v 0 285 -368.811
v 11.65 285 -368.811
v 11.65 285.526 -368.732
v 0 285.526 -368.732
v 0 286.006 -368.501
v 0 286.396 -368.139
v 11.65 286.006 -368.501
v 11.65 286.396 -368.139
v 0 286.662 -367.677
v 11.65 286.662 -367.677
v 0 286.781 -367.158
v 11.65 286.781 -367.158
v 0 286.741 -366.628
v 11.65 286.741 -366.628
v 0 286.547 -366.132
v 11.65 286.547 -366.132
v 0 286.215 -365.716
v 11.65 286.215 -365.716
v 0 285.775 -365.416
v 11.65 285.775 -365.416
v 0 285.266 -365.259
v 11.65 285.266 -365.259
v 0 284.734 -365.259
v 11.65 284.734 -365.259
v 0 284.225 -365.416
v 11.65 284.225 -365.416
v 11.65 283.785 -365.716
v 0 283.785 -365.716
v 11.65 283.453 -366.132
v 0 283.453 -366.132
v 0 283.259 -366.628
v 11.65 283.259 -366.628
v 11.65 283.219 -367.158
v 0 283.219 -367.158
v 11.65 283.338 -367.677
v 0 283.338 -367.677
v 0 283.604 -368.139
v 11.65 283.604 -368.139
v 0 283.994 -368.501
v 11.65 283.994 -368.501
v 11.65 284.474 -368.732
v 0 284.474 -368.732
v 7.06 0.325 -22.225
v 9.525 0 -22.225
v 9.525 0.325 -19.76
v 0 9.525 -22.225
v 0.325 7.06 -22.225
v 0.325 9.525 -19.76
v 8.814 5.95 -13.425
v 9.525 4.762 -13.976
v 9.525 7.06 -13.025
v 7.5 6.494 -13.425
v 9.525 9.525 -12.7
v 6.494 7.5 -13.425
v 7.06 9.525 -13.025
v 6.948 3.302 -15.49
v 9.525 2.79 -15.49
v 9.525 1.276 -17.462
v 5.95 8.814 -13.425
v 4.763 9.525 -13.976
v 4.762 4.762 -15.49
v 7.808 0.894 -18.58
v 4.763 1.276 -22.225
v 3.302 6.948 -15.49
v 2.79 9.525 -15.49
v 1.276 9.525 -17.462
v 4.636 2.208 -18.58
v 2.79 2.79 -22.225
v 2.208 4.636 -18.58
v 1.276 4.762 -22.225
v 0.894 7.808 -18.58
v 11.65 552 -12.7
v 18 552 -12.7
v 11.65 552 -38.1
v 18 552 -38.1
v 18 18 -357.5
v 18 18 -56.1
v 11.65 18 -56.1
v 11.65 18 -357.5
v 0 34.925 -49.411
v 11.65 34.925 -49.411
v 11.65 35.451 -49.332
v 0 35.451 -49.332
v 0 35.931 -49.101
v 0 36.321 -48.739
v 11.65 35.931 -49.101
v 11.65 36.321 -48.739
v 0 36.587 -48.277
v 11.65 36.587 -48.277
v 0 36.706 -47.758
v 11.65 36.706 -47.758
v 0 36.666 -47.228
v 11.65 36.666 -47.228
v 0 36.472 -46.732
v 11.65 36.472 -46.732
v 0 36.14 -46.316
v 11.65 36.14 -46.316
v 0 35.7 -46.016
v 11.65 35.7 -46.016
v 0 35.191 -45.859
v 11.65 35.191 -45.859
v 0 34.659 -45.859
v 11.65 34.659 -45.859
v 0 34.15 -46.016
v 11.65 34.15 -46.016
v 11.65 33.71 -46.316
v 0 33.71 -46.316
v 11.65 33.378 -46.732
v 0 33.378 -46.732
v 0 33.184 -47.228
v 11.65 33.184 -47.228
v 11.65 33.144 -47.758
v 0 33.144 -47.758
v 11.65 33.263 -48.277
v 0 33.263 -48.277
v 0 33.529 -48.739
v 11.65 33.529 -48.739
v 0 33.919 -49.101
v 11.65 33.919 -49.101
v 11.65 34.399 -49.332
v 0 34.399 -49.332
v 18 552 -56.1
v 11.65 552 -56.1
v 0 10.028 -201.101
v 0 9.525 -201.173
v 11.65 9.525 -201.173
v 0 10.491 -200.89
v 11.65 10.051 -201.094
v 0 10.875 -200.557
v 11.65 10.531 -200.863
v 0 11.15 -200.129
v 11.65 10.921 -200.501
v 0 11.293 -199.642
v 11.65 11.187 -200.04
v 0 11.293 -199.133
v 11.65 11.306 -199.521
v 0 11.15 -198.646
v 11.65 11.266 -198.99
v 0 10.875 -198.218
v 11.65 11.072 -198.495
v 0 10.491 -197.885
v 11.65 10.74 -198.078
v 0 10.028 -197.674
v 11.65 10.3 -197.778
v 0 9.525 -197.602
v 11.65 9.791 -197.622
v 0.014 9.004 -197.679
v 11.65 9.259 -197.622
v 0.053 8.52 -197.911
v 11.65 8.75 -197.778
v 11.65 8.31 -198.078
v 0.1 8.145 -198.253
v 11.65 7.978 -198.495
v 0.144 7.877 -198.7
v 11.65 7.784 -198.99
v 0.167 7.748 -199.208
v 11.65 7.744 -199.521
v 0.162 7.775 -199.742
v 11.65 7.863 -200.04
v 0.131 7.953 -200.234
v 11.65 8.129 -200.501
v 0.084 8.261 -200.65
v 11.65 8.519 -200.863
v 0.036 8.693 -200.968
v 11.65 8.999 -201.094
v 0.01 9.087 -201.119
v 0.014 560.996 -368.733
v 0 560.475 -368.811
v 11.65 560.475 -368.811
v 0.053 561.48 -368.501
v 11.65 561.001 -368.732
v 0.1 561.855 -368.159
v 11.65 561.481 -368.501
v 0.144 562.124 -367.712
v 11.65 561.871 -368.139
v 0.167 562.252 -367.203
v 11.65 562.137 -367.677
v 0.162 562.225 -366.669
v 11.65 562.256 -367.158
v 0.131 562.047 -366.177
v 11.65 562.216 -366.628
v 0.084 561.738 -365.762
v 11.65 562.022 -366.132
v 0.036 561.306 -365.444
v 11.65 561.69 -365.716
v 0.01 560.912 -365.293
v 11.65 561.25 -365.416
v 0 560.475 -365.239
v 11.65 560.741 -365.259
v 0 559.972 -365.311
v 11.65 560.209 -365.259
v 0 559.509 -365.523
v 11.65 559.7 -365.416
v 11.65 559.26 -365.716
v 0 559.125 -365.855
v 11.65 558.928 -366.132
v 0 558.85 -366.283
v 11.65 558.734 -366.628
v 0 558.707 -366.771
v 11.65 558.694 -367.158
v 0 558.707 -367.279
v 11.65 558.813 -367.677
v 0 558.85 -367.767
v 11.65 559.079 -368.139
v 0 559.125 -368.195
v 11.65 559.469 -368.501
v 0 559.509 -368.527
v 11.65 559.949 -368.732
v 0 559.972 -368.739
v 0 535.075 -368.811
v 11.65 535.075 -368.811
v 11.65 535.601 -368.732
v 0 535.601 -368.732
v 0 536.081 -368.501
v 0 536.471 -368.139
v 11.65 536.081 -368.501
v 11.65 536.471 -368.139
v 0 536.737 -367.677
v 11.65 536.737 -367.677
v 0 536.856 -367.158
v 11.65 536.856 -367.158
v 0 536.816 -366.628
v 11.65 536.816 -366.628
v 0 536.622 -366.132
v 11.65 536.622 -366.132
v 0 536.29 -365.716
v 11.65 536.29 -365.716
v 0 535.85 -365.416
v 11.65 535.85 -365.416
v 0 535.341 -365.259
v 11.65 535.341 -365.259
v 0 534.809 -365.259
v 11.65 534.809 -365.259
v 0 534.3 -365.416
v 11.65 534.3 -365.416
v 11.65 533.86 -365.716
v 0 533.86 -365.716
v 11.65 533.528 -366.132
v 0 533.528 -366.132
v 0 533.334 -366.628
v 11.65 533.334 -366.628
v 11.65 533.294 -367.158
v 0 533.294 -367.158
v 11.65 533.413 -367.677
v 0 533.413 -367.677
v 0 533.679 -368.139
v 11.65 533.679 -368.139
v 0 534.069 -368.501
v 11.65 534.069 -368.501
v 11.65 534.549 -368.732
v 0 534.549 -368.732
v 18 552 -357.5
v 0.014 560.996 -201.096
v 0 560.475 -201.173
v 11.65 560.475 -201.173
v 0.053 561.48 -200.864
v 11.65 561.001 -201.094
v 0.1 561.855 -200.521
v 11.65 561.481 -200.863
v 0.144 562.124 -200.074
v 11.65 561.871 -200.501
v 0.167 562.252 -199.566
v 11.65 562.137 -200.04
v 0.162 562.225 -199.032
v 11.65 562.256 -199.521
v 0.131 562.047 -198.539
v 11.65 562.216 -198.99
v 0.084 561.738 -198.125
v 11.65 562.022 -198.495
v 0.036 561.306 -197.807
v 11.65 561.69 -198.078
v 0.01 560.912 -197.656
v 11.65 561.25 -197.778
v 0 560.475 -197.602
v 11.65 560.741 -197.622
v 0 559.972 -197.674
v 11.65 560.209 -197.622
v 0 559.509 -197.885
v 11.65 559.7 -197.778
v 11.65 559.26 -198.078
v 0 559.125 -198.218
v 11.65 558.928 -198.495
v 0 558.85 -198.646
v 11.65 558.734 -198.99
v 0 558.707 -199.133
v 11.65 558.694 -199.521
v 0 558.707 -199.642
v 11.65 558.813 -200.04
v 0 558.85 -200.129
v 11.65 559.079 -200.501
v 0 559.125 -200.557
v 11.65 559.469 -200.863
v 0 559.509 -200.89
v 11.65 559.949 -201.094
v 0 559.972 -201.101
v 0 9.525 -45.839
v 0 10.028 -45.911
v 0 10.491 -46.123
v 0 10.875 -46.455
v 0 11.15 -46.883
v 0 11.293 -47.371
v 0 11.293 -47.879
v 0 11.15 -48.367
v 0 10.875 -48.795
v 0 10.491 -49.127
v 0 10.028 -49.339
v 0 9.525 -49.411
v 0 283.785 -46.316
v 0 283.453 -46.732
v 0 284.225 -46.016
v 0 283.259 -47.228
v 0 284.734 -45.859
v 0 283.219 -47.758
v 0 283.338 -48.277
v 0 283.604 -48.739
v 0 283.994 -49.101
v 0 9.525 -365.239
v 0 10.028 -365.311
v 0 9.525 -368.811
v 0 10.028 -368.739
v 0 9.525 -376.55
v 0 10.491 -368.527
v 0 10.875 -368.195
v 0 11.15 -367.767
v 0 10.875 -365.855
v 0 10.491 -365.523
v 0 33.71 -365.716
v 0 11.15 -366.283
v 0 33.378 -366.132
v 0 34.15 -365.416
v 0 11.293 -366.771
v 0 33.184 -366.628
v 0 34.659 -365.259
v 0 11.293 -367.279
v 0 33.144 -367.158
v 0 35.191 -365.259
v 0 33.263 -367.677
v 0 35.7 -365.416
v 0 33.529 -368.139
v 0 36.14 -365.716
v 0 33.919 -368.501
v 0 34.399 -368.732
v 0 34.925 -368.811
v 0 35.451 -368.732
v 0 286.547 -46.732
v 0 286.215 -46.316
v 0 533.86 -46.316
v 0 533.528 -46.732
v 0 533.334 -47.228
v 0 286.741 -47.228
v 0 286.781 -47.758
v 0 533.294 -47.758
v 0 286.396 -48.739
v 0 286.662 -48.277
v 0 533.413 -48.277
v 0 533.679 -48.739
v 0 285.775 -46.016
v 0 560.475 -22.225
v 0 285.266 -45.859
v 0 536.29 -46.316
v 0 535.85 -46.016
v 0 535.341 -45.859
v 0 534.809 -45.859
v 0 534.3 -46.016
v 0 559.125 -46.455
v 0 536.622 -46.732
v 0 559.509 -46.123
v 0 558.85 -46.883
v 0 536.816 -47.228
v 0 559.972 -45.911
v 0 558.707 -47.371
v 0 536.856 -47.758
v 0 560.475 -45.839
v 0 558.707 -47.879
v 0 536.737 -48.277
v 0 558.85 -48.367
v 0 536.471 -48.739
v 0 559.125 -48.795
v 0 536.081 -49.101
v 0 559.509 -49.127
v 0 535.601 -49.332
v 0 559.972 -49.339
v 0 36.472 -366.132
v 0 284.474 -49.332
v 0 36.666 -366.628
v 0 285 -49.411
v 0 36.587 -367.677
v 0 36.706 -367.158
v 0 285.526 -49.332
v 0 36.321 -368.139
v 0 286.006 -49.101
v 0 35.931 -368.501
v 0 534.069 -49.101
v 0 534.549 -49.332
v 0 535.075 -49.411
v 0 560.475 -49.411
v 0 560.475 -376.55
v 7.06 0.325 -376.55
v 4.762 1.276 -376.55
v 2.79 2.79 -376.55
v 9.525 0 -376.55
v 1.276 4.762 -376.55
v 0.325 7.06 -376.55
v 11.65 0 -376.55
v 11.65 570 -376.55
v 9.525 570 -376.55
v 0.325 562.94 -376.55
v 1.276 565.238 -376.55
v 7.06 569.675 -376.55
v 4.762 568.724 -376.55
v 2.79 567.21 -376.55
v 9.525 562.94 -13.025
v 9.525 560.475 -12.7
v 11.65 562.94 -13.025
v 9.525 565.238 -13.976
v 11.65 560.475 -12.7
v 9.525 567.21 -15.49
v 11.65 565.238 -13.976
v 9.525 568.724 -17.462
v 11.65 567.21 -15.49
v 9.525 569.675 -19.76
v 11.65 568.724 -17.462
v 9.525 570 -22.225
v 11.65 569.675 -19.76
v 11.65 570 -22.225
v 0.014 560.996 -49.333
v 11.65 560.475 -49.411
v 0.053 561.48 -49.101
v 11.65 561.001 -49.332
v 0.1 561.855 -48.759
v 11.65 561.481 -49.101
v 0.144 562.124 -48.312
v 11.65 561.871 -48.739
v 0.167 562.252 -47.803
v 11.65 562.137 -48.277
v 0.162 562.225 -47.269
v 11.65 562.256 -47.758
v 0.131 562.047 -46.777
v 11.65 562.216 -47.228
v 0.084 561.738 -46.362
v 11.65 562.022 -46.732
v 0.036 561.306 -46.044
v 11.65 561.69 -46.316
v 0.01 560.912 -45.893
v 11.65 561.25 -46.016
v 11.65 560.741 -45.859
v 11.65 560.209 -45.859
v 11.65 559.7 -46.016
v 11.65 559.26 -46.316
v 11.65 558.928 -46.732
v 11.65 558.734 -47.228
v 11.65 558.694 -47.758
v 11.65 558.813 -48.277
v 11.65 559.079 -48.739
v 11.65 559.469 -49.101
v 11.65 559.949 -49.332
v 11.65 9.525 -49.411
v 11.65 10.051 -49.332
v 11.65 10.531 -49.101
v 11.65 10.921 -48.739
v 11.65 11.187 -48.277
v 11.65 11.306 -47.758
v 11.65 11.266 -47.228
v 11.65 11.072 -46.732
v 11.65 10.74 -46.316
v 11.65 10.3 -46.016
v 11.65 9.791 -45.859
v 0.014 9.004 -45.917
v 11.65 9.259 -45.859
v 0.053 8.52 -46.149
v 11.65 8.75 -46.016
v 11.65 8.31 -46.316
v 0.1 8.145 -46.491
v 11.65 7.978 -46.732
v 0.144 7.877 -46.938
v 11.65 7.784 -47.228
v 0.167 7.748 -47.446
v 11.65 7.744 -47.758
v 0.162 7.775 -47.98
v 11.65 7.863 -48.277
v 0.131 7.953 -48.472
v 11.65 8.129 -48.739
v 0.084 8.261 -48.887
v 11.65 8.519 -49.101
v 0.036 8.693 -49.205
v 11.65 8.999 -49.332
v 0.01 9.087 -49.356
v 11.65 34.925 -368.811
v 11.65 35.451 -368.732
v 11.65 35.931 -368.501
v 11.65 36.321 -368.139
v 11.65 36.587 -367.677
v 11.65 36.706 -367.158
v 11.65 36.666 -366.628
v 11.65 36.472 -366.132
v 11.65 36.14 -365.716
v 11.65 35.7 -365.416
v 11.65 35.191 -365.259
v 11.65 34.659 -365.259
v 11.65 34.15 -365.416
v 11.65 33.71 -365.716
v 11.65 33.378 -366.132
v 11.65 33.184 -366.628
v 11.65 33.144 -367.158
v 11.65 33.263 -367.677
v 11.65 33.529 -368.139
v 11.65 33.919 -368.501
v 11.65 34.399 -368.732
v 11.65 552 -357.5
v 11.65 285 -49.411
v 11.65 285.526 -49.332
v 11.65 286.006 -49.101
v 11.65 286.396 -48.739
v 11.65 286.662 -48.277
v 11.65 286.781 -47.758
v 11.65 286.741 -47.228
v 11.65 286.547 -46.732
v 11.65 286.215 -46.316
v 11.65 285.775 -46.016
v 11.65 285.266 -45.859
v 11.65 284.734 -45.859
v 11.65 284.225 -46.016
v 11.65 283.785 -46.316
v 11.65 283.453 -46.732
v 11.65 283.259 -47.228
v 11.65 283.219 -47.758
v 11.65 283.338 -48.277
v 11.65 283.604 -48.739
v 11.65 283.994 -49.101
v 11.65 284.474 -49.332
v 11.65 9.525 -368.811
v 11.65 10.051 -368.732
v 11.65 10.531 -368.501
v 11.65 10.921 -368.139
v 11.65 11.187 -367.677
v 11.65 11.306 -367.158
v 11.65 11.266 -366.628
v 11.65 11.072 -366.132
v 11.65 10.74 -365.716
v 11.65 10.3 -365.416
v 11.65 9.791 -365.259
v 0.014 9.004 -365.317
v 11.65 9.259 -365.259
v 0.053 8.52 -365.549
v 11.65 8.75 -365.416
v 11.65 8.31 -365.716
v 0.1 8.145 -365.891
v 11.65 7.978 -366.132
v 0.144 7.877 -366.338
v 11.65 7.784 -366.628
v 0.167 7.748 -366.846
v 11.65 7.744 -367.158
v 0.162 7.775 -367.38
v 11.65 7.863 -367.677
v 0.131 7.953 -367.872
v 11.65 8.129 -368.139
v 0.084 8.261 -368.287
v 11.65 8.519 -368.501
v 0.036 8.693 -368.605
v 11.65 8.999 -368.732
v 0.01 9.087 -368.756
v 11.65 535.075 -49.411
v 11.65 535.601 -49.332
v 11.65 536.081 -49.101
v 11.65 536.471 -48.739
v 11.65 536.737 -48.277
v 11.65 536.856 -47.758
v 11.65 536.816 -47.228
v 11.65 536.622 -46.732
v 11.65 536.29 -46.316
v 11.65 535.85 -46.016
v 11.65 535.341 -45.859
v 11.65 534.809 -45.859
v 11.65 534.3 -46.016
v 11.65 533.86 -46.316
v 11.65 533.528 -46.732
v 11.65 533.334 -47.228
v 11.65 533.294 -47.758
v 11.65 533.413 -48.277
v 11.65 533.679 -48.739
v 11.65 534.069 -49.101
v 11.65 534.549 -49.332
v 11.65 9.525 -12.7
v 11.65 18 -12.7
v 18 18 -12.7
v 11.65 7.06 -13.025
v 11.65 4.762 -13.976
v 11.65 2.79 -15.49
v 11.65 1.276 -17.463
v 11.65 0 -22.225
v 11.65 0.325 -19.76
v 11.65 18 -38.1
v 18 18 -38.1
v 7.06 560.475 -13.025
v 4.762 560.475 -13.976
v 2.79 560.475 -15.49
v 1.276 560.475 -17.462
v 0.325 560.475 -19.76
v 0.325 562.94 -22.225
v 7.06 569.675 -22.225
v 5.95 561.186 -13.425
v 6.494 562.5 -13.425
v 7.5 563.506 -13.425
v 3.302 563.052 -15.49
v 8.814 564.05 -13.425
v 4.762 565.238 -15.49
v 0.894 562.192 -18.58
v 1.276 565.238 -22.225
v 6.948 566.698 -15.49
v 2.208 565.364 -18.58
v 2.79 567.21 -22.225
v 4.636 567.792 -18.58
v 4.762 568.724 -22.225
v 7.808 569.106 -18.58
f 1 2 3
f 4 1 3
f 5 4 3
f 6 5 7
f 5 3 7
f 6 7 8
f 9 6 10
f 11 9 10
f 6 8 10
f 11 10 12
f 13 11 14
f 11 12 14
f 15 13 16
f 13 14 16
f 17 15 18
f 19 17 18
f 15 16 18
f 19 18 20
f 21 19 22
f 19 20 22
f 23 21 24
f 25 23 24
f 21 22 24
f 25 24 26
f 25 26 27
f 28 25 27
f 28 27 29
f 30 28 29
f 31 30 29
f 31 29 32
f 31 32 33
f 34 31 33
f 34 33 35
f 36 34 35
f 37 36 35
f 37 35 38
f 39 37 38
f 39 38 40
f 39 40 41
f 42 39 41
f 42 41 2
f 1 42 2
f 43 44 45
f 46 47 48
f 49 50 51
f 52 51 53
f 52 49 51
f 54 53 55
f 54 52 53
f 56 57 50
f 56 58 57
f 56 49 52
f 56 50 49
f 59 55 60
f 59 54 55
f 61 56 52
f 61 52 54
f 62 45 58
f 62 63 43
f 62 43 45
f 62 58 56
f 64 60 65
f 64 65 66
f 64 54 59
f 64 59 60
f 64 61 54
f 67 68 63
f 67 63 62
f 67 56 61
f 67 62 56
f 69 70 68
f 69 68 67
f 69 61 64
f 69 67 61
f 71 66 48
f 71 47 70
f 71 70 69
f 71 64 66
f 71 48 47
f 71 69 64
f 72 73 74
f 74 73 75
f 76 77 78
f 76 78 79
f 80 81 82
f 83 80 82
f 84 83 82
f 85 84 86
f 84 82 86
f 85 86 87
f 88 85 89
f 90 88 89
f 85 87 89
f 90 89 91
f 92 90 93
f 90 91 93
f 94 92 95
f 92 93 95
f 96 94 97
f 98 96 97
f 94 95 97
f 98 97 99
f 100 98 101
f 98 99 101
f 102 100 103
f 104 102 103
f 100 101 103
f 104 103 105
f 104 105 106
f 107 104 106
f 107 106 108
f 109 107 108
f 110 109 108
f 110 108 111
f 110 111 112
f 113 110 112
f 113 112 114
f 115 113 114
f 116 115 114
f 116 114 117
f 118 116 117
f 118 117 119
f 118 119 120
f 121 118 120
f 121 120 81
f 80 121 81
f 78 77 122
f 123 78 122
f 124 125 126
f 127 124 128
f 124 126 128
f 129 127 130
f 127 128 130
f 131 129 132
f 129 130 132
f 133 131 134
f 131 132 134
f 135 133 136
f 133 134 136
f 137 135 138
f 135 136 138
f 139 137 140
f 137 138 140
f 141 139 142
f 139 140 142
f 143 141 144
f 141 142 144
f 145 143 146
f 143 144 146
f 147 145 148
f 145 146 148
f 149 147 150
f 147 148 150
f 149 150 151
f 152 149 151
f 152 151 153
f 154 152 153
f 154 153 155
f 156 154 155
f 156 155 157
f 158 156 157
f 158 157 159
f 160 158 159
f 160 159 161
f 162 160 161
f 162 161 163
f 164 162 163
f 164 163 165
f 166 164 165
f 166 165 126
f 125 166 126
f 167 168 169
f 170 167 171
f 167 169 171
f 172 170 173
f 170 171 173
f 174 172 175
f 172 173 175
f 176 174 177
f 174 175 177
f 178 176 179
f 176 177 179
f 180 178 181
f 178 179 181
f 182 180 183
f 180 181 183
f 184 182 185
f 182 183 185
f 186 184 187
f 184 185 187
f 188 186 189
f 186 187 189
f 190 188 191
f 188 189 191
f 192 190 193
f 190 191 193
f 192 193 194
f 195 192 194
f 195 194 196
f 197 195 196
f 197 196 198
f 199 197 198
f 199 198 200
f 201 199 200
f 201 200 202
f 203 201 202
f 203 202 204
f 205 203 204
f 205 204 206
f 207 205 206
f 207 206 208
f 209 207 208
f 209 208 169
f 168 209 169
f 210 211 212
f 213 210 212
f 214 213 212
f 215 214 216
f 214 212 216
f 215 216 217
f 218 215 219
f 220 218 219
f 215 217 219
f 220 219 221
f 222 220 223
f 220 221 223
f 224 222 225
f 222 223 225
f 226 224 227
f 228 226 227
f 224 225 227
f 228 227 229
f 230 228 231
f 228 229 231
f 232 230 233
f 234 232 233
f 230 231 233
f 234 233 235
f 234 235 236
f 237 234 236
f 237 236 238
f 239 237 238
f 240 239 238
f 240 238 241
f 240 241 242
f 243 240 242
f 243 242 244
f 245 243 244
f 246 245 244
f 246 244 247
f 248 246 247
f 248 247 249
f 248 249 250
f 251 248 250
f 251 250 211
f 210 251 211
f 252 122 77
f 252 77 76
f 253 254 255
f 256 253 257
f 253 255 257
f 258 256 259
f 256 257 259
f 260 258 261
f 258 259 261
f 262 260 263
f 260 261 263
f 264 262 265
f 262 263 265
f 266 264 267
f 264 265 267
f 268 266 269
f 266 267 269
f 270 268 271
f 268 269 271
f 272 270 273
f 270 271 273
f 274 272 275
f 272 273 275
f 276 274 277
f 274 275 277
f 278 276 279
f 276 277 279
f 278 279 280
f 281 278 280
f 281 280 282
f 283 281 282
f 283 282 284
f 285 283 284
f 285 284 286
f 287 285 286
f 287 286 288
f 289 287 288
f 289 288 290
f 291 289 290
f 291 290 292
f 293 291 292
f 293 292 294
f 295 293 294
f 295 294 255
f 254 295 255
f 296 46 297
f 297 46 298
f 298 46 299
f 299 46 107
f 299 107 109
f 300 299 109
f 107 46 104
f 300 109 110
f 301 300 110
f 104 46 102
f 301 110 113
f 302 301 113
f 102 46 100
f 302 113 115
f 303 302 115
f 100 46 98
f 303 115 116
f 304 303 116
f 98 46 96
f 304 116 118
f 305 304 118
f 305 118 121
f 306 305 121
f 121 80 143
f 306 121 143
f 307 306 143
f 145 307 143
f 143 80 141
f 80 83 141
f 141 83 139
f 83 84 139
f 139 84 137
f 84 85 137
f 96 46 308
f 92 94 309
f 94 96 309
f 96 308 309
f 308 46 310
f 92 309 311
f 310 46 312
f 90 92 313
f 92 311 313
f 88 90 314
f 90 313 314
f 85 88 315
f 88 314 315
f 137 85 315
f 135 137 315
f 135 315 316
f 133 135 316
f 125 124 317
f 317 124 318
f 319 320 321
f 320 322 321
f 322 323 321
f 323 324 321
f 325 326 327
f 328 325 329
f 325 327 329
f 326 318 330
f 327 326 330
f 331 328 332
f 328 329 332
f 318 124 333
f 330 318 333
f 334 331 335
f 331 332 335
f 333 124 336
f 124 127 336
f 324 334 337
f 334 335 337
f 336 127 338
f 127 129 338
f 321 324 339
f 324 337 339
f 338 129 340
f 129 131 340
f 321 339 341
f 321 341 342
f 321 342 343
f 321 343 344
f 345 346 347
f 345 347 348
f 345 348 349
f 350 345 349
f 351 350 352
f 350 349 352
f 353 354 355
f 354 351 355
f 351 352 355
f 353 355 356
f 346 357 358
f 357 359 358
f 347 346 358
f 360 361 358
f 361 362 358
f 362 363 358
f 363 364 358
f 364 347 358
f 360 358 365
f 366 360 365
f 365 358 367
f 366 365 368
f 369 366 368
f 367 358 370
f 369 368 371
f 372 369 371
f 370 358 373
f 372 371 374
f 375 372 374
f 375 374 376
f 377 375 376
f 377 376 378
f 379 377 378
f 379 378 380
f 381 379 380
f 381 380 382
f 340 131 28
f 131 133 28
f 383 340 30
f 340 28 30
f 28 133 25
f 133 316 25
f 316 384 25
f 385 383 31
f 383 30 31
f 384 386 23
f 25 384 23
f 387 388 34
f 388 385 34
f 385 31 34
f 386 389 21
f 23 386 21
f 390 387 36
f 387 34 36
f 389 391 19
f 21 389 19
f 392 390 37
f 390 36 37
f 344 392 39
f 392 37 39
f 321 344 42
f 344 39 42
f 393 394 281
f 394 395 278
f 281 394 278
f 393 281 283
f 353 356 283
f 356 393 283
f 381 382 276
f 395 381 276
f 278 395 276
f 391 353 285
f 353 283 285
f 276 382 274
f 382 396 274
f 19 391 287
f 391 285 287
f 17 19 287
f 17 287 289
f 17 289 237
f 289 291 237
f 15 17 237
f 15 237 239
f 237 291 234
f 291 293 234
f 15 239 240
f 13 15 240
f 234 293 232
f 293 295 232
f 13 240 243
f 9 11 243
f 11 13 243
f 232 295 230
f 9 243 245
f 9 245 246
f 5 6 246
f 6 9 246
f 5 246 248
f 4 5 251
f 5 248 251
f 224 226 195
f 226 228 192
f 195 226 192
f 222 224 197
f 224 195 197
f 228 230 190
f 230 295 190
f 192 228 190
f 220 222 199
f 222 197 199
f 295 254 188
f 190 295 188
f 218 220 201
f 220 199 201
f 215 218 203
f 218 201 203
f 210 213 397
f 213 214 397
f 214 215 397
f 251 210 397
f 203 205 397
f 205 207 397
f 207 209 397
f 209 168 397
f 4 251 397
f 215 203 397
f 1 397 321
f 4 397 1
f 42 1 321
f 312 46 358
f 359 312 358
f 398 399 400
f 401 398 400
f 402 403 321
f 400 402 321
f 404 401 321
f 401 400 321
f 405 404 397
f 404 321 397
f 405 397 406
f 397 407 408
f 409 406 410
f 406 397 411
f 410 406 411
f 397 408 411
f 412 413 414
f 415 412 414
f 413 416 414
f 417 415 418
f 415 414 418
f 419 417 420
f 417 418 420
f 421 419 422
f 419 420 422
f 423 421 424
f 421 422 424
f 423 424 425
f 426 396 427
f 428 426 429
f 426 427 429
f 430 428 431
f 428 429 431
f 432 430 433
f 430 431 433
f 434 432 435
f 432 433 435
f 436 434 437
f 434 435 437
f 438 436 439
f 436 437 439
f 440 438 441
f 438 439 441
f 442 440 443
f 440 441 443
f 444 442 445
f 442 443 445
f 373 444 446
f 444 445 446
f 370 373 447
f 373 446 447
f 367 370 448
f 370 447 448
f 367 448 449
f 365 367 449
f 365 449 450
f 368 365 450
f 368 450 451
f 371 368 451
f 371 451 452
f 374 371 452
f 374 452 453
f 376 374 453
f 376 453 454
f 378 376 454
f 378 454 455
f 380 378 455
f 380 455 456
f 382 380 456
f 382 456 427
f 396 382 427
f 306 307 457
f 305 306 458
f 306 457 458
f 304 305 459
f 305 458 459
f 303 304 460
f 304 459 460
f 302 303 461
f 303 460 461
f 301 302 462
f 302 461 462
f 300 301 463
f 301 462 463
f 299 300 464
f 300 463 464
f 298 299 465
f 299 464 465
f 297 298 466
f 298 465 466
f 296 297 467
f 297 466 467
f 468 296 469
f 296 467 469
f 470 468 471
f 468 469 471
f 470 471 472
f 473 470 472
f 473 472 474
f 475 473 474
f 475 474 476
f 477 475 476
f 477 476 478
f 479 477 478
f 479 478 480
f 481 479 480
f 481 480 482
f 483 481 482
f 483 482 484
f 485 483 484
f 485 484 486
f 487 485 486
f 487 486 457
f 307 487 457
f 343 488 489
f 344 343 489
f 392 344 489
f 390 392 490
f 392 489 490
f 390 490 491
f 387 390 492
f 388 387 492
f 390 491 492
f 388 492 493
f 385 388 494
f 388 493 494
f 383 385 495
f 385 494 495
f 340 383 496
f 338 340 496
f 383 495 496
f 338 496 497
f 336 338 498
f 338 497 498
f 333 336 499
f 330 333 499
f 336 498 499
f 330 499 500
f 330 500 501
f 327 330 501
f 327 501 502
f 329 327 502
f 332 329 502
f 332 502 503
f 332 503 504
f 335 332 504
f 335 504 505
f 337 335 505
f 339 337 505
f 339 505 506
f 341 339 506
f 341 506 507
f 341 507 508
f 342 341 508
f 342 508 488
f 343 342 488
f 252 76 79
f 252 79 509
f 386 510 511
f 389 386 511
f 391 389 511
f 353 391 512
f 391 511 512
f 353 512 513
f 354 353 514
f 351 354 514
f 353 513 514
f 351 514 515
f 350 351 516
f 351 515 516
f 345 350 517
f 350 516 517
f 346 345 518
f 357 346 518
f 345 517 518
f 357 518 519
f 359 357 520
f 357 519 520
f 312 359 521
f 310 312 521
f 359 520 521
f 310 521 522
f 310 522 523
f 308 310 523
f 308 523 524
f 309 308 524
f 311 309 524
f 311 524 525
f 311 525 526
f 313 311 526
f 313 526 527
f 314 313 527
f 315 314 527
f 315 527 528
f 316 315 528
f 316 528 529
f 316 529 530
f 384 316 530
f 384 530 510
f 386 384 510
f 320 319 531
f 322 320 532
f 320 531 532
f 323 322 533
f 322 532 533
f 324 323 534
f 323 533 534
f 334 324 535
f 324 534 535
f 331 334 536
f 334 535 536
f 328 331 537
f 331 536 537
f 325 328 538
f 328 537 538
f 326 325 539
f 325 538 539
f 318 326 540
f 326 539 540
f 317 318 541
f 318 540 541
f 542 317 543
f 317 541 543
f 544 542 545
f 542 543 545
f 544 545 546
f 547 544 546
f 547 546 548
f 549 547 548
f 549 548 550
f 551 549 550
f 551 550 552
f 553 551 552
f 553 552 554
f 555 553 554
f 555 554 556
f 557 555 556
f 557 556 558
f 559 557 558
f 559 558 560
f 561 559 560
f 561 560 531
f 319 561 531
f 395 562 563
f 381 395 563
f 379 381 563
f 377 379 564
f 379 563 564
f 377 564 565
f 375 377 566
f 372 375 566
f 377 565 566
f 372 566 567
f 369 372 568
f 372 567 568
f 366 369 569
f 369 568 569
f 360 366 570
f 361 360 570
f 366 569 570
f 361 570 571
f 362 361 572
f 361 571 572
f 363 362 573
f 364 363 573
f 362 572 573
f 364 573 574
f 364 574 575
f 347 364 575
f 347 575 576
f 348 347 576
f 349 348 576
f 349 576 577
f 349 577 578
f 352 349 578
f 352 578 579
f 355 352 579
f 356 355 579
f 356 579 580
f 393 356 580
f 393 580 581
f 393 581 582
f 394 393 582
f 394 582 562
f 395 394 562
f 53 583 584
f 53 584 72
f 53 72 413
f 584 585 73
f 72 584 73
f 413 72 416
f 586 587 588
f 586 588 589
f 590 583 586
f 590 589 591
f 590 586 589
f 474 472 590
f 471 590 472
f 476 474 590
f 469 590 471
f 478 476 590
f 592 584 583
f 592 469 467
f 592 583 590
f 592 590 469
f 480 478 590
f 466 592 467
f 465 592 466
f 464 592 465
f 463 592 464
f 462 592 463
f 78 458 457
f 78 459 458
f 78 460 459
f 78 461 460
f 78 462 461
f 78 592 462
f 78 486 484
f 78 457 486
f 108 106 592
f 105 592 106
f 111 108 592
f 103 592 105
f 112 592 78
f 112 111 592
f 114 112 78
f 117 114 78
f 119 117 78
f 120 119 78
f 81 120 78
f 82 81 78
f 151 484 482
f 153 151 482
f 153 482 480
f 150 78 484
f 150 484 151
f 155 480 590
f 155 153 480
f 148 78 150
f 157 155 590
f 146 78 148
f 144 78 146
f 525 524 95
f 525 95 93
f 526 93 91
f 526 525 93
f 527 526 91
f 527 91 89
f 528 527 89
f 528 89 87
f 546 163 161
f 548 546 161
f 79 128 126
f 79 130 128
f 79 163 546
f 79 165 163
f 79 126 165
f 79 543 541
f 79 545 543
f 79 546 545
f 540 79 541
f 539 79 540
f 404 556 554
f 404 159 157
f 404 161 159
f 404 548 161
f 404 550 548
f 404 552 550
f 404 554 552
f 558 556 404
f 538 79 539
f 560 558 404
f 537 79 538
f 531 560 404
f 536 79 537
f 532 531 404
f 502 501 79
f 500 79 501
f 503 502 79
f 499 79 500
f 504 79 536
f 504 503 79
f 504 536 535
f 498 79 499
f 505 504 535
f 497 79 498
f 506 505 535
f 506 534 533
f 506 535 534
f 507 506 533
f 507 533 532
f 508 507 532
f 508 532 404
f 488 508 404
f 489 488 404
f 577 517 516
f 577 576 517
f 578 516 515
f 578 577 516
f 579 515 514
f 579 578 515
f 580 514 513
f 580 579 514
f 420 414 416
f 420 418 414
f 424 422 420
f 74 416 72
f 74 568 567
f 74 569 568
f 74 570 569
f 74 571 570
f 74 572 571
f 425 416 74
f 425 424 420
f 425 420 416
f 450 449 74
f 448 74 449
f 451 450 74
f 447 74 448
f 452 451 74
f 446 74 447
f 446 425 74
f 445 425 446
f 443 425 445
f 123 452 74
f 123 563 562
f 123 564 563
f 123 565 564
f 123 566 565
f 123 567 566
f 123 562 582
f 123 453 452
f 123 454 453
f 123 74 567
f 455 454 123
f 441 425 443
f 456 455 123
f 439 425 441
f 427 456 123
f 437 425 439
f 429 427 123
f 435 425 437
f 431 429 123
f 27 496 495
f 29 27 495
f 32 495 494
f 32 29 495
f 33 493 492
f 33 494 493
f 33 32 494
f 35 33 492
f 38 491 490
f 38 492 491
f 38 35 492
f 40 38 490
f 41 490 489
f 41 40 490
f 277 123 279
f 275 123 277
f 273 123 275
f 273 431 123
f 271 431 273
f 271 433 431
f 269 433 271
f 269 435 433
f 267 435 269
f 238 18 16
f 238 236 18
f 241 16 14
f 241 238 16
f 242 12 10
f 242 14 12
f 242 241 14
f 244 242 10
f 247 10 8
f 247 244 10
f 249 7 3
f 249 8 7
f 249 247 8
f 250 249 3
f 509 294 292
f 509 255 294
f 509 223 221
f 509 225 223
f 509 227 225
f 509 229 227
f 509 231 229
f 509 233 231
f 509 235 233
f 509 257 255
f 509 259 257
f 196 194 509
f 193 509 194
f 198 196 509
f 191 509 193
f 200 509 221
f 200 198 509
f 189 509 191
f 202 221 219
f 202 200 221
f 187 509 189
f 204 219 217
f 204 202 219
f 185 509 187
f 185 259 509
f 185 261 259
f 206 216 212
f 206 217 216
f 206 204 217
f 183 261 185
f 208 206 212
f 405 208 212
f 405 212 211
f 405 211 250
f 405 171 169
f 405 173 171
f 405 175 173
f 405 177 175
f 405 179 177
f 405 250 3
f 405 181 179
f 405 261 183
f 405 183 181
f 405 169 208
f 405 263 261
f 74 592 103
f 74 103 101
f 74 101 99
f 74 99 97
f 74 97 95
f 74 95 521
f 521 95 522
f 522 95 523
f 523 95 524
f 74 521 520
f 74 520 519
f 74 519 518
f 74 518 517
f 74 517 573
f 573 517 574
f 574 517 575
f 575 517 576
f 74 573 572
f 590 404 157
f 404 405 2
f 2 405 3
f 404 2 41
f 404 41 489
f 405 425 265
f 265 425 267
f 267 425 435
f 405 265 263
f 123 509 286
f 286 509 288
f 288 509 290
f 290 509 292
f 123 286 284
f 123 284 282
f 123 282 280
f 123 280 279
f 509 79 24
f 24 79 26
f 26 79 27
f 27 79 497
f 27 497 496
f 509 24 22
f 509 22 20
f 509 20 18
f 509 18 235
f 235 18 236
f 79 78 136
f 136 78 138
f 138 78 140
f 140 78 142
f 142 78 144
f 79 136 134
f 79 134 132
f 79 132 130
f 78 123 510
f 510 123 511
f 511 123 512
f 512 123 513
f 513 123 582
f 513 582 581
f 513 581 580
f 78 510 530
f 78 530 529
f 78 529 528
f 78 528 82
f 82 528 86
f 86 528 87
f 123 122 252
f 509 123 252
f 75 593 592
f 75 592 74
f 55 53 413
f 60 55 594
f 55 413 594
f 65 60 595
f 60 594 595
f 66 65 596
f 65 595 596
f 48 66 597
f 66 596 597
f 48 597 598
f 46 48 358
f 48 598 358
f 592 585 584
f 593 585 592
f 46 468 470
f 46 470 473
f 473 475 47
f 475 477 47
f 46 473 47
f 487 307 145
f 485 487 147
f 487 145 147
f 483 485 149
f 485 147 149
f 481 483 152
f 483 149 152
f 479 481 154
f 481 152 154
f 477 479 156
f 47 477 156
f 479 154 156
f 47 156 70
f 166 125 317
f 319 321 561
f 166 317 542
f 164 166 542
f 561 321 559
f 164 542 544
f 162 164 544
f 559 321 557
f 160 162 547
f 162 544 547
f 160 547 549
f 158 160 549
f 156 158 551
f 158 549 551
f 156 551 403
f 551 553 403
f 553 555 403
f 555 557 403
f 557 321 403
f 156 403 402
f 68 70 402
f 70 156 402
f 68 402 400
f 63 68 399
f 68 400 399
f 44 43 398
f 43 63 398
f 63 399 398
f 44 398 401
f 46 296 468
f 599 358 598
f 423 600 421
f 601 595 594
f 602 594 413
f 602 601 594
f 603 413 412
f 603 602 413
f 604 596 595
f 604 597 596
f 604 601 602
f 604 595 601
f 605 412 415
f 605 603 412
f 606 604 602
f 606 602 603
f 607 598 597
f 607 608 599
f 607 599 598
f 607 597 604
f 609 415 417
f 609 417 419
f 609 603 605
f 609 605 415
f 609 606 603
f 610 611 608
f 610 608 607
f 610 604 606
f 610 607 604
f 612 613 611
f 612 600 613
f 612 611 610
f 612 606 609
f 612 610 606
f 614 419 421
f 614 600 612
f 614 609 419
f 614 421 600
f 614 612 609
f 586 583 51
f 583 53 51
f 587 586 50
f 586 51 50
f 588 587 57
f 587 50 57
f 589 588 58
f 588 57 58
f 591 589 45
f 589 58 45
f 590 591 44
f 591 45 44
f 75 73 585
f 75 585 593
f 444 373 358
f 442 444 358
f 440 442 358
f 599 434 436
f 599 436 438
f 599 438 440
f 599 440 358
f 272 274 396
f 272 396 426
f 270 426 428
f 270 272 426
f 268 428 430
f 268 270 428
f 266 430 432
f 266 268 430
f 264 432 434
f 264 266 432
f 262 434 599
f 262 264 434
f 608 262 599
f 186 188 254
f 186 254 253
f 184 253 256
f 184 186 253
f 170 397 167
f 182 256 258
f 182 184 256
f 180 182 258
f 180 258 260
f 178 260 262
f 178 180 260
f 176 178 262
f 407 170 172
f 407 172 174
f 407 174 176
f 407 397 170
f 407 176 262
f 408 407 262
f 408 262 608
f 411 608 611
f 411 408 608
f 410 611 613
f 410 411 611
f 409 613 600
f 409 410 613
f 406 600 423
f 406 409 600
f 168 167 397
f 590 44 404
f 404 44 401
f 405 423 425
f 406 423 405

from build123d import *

# Parameters (mm, degrees)
SKETCH1_W           = 376.55000001
SKETCH1_H           = 570
BOSS_EXTRUDE1_DEPTH = 18
SKETCH5_W           = 18
SKETCH5_H           = 557.3
CUT_EXTRUDE3_DEPTH  = 6.35
SKETCH7_W           = 376.55000001
SKETCH7_H           = 18
CUT_EXTRUDE4_DEPTH  = 6.35
FILLET1_R           = 9.525
SKETCH9_W           = 19.05
SKETCH9_H           = 534
CUT_EXTRUDE6_DEPTH  = 6.35
SKETCH10_W          = 12.7
SKETCH10_H          = 570
CUT_EXTRUDE7_DEPTH  = 19
FILLET2_R           = 9.525
SKETCH11_R          = 1.7859375
CUT_EXTRUDE8_DEPTH  = 12.65


with BuildPart() as part:
    # Sketch1 → Boss-Extrude1 (new body)
    with BuildSketch(Plane(origin=(0, 0, 0), x_dir=(0, 0, -1), z_dir=(1, 0, 0))):
        with Locations((188.275000005, 285)):
            Rectangle(SKETCH1_W, SKETCH1_H)
    extrude(amount=BOSS_EXTRUDE1_DEPTH)

    # Sketch5 → Cut-Extrude3 (cut)
    with BuildSketch(Plane(origin=(18, 0, 0), x_dir=(0, 0, -1), z_dir=(1, 0, 0))):
        with Locations((47.1, 285)):
            Rectangle(SKETCH5_W, SKETCH5_H)
    extrude(amount=-CUT_EXTRUDE3_DEPTH, mode=Mode.SUBTRACT)

    # Sketch7 → Cut-Extrude4 (cut)
    with BuildSketch(Plane(origin=(18, 0, 0), x_dir=(0, 0, -1), z_dir=(1, 0, 0))):
        with Locations((188.275000005, 9)):
            Rectangle(SKETCH7_W, SKETCH7_H)
        with Locations((188.275000005, 561)):
            Rectangle(SKETCH7_W, SKETCH7_H)
    extrude(amount=-CUT_EXTRUDE4_DEPTH, mode=Mode.SUBTRACT)

    # Fillet1
    fillet1_edges = [part.edges().sort_by_distance(p)[0] for p in [
        (5.825, 0, 0),
        (0, 570, -188.275000005),
        (0, 0, -188.275000005),
        (5.825, 570, 0),
        (0, 285, 0),
    ]]
    fillet(fillet1_edges, radius=FILLET1_R)

    # Sketch9 → Cut-Extrude6 (cut)
    with BuildSketch(Plane(origin=(18, 0, 0), x_dir=(0, 0, -1), z_dir=(1, 0, 0))):
        with Locations((367.02500001, 285)):
            Rectangle(SKETCH9_W, SKETCH9_H)
    extrude(amount=-CUT_EXTRUDE6_DEPTH, mode=Mode.SUBTRACT)

    # Sketch10 → Cut-Extrude7 (cut, through all)
    with BuildSketch(Plane(origin=(18, 0, 0), x_dir=(0, 0, -1), z_dir=(1, 0, 0))):
        with Locations((6.35, 285)):
            Rectangle(SKETCH10_W, SKETCH10_H)
    extrude(amount=-CUT_EXTRUDE7_DEPTH, mode=Mode.SUBTRACT)

    # Fillet2
    fillet2_edges = [part.edges().sort_by_distance(p)[0] for p in [
        (2.789807909, 2.789807909, -12.7),
        (0, 285, -12.7),
        (10.5875, 570, -12.7),
        (2.789807909, 567.210192091, -12.7),
        (10.5875, 0, -12.7),
    ]]
    fillet(fillet2_edges, radius=FILLET2_R)

    # Sketch11 → Cut-Extrude8 (cut, through all)
    with BuildSketch(Plane(origin=(11.65, 0, 0), x_dir=(0, 0, -1), z_dir=(1, 0, 0))):
        with Locations((47.625, 285)):
            Circle(SKETCH11_R)
        with Locations((47.625, 560.475)):
            Circle(SKETCH11_R)
        with Locations((199.387500005, 560.475)):
            Circle(SKETCH11_R)
        with Locations((367.02500001, 560.475)):
            Circle(SKETCH11_R)
        with Locations((367.02500001, 285)):
            Circle(SKETCH11_R)
        with Locations((367.02500001, 9.525)):
            Circle(SKETCH11_R)
        with Locations((199.387500005, 9.525)):
            Circle(SKETCH11_R)
        with Locations((47.625, 9.525)):
            Circle(SKETCH11_R)
        with Locations((47.625, 34.925)):
            Circle(SKETCH11_R)
        with Locations((367.02500001, 34.925)):
            Circle(SKETCH11_R)
        with Locations((47.625, 535.075)):
            Circle(SKETCH11_R)
        with Locations((367.02500001, 535.075)):
            Circle(SKETCH11_R)
    extrude(amount=-CUT_EXTRUDE8_DEPTH, mode=Mode.SUBTRACT)


solid = part.part
